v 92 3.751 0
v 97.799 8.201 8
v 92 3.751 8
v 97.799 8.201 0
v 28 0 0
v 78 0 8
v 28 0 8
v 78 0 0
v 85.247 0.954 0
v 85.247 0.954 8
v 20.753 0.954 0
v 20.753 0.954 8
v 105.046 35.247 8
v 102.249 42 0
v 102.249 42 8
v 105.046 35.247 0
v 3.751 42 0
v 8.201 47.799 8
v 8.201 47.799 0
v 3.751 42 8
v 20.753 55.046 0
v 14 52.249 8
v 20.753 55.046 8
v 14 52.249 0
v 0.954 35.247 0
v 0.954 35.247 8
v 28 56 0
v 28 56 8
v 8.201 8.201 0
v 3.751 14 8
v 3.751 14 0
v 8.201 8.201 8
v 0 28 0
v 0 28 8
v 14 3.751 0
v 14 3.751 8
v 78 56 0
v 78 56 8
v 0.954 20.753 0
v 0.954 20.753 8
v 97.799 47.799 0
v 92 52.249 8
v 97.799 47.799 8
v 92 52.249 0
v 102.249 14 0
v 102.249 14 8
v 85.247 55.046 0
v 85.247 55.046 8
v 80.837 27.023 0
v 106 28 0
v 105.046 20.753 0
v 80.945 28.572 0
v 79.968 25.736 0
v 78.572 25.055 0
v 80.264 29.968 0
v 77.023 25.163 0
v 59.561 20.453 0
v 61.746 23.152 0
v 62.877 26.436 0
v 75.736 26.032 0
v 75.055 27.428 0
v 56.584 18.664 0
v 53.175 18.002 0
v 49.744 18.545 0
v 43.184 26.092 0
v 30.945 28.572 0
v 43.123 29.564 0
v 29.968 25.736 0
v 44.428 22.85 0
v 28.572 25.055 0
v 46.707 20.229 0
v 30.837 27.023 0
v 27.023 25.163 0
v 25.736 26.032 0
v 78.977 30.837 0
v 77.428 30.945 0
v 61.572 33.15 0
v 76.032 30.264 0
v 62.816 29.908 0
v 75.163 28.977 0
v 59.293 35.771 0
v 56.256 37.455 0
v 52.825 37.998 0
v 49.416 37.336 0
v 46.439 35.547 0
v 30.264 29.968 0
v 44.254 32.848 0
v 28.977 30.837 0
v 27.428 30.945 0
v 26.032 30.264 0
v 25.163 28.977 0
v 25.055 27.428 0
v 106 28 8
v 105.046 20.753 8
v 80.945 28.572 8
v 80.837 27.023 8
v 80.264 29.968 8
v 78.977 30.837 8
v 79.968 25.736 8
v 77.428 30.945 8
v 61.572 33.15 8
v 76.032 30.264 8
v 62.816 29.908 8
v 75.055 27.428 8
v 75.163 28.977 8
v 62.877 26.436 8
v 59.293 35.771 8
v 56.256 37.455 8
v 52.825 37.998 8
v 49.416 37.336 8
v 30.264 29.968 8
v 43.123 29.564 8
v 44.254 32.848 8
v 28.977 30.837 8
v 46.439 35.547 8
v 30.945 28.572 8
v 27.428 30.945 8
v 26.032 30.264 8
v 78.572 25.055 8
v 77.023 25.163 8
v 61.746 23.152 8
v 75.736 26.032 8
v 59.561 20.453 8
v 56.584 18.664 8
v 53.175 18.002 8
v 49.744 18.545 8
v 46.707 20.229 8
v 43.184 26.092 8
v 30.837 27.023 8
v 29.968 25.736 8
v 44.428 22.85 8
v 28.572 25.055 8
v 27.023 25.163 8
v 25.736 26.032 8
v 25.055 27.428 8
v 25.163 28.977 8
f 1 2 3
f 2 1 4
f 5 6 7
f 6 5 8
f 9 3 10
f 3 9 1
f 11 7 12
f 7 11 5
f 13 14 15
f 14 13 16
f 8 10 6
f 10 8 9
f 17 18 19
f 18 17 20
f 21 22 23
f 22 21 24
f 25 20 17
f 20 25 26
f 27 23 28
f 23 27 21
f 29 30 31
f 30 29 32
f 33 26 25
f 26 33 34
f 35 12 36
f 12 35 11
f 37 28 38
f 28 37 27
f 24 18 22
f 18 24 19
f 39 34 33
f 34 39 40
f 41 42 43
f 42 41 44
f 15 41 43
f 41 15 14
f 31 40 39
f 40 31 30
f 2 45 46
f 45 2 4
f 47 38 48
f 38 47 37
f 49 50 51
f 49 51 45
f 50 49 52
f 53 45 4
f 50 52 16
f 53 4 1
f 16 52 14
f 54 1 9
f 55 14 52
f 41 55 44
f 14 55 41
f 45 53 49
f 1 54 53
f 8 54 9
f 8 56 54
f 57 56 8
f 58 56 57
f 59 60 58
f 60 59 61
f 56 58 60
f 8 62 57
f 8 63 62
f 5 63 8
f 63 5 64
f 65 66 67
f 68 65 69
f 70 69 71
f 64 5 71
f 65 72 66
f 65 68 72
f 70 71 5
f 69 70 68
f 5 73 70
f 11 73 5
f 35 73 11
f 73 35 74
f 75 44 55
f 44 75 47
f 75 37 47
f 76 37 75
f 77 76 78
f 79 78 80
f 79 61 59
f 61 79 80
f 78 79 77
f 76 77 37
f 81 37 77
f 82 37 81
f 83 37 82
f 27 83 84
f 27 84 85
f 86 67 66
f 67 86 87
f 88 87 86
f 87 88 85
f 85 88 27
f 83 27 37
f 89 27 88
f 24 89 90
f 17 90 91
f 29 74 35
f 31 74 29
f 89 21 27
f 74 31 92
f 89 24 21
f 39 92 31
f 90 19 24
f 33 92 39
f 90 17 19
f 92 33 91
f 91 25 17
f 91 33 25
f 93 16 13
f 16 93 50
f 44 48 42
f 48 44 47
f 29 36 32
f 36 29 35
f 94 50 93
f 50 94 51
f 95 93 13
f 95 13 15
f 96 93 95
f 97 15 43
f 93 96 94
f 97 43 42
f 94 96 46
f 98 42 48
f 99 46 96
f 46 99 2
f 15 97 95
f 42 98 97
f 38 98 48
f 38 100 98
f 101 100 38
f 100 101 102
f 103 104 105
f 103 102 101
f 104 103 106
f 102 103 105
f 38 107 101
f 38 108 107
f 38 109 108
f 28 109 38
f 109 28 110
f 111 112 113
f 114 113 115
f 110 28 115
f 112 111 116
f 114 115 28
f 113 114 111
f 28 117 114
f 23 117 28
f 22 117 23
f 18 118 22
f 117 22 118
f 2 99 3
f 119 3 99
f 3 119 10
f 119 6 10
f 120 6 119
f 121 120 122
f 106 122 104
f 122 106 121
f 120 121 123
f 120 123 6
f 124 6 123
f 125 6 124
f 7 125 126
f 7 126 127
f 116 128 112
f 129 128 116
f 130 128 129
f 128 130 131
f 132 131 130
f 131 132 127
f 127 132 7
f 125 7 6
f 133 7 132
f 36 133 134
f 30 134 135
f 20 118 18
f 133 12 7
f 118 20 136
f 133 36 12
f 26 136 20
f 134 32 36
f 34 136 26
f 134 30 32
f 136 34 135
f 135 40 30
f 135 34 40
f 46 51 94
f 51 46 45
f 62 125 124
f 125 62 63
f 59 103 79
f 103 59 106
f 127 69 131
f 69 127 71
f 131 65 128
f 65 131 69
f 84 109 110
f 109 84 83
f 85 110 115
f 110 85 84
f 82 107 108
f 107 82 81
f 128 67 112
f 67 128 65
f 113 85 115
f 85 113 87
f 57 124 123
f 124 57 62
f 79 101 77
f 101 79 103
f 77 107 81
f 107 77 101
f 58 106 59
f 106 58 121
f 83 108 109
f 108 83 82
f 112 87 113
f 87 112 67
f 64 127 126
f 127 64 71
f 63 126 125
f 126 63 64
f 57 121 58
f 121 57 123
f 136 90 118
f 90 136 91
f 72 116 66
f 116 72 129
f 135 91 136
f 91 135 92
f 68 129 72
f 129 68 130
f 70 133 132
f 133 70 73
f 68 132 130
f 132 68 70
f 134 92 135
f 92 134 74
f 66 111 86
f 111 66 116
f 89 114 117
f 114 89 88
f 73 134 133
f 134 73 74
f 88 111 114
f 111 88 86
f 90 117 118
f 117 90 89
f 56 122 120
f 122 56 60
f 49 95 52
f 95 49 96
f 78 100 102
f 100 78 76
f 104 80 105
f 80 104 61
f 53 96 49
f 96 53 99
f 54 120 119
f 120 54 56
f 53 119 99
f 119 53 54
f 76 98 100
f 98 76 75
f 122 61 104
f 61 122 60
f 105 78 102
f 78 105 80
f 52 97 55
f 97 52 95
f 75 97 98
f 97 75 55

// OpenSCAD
$fn = 32;

// ----------------------------------------------------------------------
// Spacer plate: obround span 50, caps R28
// ----------------------------------------------------------------------

// --- parameters (mm) ---
bore_r = 10;              // centre bore radius
bolt_r = 3;               // bolt hole radius
plate_t = 8;              // plate thickness, Z (extrusion height)
span = 50;                // obround span
cap_r = 28;               // cap radius

profile = [[28, 56], [20.753, 55.046], [14, 52.249], [8.201, 47.799], [3.751, 42], [0.954, 35.247], [0, 28], [0.954, 20.753], [3.751, 14], [8.201, 8.201], [14, 3.751], [20.753, 0.954], [28, 0], [78, 0], [85.247, 0.954], [92, 3.751], [97.799, 8.201], [102.249, 14], [105.046, 20.753], [106, 28], [105.046, 35.247], [102.249, 42], [97.799, 47.799], [92, 52.249], [85.247, 55.046], [78, 56]];  // primary outline, 26 points, counter clockwise
void_1 = [[62.816, 29.908], [61.572, 33.15], [59.293, 35.771], [56.256, 37.455], [52.825, 37.998], [49.416, 37.336], [46.439, 35.547], [44.254, 32.848], [43.123, 29.564], [43.184, 26.092], [44.428, 22.85], [46.707, 20.229], [49.744, 18.545], [53.175, 18.002], [56.584, 18.664], [59.561, 20.453], [61.746, 23.152], [62.877, 26.436]];  // centre bore, 18 points
void_2 = [[30.945, 28.572], [30.264, 29.968], [28.977, 30.837], [27.428, 30.945], [26.032, 30.264], [25.163, 28.977], [25.055, 27.428], [25.736, 26.032], [27.023, 25.163], [28.572, 25.055], [29.968, 25.736], [30.837, 27.023]];  // end hole, 12 points
void_3 = [[80.945, 28.572], [80.264, 29.968], [78.977, 30.837], [77.428, 30.945], [76.032, 30.264], [75.163, 28.977], [75.055, 27.428], [75.736, 26.032], [77.023, 25.163], [78.572, 25.055], [79.968, 25.736], [80.837, 27.023]];  // end hole, 12 points

// --- the one profile operation ---
difference() {
  linear_extrude(height = plate_t) polygon(points = profile);
  translate([0, 0, -1])
    linear_extrude(height = plate_t + 2) polygon(points = void_1);
  translate([0, 0, -1])
    linear_extrude(height = plate_t + 2) polygon(points = void_2);
  translate([0, 0, -1])
    linear_extrude(height = plate_t + 2) polygon(points = void_3);
}
